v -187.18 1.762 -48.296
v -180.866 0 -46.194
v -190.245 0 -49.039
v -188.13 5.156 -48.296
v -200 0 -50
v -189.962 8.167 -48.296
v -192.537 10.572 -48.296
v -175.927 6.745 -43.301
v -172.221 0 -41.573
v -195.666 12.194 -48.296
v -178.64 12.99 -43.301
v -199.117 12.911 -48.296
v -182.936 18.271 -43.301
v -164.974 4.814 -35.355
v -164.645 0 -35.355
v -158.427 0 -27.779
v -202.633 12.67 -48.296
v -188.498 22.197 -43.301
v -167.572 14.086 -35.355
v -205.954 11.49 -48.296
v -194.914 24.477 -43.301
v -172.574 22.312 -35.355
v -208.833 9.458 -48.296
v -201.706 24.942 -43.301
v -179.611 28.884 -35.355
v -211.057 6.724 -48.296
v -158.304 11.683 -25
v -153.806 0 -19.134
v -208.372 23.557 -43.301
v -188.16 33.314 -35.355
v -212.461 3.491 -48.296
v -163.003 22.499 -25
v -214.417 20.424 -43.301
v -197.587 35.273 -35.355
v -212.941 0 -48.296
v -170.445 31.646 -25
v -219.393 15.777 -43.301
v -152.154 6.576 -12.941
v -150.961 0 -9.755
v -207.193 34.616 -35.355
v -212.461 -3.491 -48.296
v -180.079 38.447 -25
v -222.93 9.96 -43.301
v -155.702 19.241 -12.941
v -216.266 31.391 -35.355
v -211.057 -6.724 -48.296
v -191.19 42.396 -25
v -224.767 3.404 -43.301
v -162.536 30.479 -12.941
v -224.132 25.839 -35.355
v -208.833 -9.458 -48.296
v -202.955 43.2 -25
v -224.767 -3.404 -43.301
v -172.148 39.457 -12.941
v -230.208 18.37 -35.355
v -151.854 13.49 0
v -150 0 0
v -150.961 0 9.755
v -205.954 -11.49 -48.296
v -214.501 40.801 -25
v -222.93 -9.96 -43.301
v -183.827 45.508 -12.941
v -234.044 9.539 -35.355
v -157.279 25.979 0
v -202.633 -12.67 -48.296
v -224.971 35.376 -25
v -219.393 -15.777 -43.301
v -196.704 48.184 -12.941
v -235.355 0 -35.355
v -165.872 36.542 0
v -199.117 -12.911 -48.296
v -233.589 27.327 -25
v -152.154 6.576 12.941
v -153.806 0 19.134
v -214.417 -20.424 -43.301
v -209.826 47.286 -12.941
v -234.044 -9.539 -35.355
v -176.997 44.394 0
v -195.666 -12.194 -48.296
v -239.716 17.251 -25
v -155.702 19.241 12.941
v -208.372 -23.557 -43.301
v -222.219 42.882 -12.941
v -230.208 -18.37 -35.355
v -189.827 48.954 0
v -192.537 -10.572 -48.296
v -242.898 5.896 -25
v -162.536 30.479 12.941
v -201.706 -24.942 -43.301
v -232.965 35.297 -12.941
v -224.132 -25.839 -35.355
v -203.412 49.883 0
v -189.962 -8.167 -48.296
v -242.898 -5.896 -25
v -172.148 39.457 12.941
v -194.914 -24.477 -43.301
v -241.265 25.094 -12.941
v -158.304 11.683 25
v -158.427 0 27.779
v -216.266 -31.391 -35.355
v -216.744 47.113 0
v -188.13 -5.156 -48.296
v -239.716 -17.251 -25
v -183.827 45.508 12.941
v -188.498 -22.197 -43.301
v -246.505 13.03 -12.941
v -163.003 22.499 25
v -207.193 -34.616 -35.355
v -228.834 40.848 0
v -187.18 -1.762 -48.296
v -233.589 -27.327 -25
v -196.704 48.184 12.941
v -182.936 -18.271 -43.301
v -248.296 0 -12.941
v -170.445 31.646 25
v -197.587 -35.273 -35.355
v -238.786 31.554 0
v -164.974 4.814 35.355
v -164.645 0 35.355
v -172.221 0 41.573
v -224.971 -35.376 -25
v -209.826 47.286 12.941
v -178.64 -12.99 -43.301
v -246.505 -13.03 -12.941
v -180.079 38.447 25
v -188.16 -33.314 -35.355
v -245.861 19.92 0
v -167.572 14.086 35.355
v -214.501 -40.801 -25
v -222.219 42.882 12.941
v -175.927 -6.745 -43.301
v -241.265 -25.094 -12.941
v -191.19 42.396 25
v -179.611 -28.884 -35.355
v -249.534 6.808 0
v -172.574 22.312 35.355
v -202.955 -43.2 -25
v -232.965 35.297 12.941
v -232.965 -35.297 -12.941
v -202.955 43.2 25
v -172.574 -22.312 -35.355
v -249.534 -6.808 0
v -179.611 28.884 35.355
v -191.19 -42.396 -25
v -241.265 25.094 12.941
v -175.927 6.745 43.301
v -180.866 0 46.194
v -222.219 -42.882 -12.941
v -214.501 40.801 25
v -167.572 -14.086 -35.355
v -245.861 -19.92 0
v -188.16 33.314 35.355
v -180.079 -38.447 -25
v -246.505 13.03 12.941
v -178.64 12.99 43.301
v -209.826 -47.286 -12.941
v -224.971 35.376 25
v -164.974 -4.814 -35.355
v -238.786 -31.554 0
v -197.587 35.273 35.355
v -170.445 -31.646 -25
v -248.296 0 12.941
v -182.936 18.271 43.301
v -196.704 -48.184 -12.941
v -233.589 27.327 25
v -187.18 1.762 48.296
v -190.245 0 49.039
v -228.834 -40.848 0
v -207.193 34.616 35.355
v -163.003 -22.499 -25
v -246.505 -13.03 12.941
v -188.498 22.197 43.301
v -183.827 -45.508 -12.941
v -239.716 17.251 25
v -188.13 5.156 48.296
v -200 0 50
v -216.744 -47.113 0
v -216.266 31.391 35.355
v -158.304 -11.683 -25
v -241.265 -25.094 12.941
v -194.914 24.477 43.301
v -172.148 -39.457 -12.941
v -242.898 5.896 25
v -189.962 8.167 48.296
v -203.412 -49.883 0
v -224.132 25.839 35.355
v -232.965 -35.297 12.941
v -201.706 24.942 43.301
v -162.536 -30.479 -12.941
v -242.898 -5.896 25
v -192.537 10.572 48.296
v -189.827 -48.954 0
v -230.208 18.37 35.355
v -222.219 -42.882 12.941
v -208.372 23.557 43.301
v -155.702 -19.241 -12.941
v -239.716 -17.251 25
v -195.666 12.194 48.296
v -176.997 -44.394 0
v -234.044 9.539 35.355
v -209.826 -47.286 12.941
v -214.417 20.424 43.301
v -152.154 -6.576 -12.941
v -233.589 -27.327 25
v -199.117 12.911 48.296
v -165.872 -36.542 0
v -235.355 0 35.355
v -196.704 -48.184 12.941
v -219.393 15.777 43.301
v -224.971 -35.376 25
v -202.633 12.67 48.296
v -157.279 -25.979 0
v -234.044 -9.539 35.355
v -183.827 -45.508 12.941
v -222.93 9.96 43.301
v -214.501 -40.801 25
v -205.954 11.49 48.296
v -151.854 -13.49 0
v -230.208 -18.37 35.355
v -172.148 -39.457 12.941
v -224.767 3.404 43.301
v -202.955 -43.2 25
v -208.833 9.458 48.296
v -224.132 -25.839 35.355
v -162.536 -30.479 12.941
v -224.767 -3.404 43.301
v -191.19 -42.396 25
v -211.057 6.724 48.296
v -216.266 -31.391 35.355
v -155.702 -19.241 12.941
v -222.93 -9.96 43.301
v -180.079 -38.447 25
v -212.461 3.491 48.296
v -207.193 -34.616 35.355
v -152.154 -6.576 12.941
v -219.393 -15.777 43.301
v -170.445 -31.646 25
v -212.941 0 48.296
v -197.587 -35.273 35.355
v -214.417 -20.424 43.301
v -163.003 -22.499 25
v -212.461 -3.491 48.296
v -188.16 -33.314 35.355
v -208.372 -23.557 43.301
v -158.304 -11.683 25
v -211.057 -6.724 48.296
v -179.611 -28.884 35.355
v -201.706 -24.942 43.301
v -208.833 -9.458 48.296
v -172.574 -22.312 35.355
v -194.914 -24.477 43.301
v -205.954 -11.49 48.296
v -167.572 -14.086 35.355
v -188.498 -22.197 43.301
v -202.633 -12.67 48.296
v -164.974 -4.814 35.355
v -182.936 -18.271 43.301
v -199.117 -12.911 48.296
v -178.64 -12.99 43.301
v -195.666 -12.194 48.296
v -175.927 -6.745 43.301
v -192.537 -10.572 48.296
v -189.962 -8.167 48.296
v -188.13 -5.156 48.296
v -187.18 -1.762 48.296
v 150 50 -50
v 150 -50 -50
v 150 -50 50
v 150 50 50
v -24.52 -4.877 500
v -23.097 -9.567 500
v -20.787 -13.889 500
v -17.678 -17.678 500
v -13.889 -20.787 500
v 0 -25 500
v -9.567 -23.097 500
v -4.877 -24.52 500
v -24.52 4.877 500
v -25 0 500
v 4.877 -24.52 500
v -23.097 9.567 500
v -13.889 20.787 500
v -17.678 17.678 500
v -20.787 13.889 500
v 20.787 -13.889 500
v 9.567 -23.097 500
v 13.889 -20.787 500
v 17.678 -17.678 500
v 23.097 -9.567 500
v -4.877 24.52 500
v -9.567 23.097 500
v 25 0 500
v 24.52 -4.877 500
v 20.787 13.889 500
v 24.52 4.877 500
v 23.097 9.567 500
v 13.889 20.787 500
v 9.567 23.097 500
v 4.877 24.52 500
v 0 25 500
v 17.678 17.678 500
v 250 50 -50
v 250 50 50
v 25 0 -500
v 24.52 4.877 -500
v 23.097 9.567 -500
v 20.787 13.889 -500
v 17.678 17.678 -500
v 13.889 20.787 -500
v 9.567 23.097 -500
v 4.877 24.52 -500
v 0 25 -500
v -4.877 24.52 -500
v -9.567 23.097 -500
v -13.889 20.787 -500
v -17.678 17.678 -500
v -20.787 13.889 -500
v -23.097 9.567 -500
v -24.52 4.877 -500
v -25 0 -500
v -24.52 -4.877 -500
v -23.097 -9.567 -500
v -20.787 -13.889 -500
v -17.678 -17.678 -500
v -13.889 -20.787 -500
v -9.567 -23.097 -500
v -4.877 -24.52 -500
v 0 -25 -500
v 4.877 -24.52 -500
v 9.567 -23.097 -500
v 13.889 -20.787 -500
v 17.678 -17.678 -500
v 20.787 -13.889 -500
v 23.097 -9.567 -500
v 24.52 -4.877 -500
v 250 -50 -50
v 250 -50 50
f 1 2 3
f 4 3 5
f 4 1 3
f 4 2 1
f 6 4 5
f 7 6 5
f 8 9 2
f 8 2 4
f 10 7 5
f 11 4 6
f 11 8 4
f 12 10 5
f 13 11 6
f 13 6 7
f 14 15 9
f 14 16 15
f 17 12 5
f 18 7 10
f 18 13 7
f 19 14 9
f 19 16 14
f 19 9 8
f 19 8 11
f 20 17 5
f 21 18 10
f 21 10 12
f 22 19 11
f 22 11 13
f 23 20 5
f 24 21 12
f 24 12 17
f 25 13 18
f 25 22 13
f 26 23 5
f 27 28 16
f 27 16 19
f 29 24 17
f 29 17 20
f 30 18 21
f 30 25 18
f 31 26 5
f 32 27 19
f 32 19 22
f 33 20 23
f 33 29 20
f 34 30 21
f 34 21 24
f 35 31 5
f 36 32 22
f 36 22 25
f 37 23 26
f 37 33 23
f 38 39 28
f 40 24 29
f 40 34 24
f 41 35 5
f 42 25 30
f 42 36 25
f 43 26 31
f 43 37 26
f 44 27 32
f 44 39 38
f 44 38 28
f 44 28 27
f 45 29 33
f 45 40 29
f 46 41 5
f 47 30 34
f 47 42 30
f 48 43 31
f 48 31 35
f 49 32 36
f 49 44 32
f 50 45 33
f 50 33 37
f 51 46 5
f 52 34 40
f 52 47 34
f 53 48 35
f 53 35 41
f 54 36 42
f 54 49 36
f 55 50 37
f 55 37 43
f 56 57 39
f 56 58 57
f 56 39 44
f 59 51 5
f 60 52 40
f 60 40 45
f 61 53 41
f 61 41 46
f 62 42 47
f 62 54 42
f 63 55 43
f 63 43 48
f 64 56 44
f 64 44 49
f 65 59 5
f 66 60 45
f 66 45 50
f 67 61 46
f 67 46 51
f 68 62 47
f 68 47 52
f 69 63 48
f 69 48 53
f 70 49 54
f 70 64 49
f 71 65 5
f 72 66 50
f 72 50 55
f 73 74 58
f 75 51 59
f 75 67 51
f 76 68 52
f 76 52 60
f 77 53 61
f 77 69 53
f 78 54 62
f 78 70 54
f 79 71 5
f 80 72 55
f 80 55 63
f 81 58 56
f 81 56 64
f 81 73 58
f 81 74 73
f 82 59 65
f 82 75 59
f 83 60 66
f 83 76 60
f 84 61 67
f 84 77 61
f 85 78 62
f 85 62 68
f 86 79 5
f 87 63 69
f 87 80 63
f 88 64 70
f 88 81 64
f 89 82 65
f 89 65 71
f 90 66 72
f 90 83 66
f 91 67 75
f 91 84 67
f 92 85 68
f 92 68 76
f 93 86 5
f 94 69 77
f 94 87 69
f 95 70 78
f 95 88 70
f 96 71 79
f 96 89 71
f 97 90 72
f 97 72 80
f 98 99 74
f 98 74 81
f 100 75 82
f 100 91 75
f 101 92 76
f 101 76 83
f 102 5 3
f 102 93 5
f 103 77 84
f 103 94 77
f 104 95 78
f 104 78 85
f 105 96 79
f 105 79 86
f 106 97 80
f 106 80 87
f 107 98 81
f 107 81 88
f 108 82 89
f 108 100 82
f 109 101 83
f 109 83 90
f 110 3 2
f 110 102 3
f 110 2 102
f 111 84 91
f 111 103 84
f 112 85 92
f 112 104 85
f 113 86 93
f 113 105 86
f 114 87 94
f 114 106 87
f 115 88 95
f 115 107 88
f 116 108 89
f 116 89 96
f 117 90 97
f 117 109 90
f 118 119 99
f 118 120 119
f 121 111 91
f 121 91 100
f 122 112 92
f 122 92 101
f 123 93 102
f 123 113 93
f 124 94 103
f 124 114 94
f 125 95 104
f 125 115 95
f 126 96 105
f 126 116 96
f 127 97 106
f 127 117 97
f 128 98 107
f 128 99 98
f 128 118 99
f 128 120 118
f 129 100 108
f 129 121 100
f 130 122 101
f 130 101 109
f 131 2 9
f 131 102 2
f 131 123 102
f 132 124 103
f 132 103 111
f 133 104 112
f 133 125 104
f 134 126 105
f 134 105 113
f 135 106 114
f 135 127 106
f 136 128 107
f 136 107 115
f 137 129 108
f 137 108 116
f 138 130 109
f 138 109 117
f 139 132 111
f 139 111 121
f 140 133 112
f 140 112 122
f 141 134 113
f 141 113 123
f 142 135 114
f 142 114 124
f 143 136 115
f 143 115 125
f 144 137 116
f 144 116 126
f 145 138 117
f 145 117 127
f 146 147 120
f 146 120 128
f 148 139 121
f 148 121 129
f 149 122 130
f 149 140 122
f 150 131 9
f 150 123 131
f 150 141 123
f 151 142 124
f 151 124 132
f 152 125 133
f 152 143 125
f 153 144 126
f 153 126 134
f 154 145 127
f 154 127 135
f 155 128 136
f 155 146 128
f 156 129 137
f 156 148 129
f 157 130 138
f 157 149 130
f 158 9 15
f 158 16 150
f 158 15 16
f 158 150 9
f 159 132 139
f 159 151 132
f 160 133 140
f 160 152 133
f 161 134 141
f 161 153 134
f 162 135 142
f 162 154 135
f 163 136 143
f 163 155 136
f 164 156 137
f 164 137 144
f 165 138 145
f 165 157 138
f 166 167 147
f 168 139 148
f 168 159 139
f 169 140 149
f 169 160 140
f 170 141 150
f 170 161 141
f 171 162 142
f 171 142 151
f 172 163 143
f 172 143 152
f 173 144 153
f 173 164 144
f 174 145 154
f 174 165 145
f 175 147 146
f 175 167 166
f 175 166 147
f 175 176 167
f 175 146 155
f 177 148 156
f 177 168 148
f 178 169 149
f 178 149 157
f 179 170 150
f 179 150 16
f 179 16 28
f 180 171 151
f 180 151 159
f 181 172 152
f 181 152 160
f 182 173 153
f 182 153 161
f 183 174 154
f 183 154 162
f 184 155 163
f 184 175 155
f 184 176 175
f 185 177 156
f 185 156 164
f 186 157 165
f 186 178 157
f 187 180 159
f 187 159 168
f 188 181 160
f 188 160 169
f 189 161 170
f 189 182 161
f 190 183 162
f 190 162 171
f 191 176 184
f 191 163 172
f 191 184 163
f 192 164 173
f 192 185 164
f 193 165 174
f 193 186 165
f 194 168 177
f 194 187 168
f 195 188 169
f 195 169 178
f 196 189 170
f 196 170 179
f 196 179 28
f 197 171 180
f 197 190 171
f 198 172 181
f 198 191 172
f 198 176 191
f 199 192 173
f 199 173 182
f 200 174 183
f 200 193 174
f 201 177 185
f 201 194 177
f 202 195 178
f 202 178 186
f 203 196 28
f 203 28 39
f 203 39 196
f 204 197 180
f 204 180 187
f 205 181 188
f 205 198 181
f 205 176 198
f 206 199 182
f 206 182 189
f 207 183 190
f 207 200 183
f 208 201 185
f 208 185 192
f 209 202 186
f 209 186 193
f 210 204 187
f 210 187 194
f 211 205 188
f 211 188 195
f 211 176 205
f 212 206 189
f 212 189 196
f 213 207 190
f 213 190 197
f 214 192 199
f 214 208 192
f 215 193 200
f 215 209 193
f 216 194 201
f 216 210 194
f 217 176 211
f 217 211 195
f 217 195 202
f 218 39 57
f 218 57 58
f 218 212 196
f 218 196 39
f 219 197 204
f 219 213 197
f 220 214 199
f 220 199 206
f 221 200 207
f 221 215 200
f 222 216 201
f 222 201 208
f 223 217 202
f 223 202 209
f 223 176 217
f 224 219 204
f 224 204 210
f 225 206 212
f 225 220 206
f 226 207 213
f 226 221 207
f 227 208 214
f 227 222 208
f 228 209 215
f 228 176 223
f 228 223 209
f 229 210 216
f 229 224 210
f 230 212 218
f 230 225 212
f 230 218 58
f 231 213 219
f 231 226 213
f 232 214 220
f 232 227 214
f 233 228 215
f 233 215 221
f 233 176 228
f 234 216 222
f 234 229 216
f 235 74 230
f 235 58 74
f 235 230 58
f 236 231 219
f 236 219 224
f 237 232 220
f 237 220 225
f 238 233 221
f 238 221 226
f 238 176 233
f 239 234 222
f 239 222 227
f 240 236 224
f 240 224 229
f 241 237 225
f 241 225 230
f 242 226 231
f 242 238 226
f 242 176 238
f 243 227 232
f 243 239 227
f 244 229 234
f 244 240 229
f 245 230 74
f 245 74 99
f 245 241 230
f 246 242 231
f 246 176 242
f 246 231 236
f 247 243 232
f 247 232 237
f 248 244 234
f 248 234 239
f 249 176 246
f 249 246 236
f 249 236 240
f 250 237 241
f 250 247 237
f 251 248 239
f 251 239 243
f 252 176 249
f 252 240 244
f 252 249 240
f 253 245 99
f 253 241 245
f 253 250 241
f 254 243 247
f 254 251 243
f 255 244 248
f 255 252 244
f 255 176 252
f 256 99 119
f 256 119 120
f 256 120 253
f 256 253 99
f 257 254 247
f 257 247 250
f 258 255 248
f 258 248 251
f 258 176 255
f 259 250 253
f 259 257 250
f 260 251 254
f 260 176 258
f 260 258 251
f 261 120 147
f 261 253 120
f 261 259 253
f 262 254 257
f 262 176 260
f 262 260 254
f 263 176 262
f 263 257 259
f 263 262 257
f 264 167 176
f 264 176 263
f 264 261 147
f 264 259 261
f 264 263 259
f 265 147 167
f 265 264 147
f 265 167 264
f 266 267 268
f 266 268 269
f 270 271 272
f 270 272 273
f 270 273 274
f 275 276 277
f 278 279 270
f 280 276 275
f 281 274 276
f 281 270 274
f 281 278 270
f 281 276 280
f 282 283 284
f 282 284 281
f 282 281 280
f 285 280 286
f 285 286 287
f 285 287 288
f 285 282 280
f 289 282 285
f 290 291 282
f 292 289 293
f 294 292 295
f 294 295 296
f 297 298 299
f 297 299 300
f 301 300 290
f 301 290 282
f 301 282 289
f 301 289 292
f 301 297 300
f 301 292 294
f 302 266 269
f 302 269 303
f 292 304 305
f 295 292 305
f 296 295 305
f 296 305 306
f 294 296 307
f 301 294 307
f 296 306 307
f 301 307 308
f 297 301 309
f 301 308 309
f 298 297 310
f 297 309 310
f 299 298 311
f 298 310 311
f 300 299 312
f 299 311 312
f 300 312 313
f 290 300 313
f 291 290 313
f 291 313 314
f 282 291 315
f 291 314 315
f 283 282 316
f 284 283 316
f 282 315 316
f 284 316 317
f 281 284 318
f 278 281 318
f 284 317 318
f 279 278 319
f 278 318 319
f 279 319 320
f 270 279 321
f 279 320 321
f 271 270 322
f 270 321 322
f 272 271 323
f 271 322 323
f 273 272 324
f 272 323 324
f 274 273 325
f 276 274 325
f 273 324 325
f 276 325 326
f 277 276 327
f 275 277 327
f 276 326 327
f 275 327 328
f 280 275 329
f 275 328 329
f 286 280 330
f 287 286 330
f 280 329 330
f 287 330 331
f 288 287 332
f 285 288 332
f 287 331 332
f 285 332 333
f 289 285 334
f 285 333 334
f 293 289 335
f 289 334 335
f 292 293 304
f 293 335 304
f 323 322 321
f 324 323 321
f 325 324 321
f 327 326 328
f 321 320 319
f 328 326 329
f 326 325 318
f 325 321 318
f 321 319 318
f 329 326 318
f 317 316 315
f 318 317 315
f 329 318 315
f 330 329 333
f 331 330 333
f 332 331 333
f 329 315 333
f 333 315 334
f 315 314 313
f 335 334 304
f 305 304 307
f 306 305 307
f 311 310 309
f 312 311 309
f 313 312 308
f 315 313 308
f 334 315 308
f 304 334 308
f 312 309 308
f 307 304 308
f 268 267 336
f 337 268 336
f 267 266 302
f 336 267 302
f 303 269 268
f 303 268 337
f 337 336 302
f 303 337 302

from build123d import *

# Parameters (mm, degrees)
CYLINDER_R     = 25
CYLINDER_DEPTH = 1000
CUBE_W         = 100
CUBE_H         = 100
CUBE_DEPTH     = 100


with BuildPart() as sphere:
    # sphere → sphere (revolve)
    with BuildSketch(Plane(origin=(-200, 0, 0), x_dir=(1, 0, 0), z_dir=(0, -1, 0))):
        with BuildLine():
            ThreePointArc((0, -50), (50, 0), (0, 50))
            Line((0, 50), (0, -50))
        make_face()
    revolve(axis=Axis((-200, 0, 0), (0, 0, 1)))


with BuildPart() as cylinder:
    # cylinder → cylinder (new body)
    with BuildSketch(Plane.XY.offset(-500)):
        Circle(CYLINDER_R)
    extrude(amount=CYLINDER_DEPTH)


with BuildPart() as cube:
    # cube → cube (new body)
    with BuildSketch(Plane(origin=(150, -50, -50), x_dir=(1, 0, 0), z_dir=(0, 0, 1))):
        with Locations((50, 50)):
            Rectangle(CUBE_W, CUBE_H)
    extrude(amount=CUBE_DEPTH)


solid = Compound([sphere.part, cylinder.part, cube.part])
